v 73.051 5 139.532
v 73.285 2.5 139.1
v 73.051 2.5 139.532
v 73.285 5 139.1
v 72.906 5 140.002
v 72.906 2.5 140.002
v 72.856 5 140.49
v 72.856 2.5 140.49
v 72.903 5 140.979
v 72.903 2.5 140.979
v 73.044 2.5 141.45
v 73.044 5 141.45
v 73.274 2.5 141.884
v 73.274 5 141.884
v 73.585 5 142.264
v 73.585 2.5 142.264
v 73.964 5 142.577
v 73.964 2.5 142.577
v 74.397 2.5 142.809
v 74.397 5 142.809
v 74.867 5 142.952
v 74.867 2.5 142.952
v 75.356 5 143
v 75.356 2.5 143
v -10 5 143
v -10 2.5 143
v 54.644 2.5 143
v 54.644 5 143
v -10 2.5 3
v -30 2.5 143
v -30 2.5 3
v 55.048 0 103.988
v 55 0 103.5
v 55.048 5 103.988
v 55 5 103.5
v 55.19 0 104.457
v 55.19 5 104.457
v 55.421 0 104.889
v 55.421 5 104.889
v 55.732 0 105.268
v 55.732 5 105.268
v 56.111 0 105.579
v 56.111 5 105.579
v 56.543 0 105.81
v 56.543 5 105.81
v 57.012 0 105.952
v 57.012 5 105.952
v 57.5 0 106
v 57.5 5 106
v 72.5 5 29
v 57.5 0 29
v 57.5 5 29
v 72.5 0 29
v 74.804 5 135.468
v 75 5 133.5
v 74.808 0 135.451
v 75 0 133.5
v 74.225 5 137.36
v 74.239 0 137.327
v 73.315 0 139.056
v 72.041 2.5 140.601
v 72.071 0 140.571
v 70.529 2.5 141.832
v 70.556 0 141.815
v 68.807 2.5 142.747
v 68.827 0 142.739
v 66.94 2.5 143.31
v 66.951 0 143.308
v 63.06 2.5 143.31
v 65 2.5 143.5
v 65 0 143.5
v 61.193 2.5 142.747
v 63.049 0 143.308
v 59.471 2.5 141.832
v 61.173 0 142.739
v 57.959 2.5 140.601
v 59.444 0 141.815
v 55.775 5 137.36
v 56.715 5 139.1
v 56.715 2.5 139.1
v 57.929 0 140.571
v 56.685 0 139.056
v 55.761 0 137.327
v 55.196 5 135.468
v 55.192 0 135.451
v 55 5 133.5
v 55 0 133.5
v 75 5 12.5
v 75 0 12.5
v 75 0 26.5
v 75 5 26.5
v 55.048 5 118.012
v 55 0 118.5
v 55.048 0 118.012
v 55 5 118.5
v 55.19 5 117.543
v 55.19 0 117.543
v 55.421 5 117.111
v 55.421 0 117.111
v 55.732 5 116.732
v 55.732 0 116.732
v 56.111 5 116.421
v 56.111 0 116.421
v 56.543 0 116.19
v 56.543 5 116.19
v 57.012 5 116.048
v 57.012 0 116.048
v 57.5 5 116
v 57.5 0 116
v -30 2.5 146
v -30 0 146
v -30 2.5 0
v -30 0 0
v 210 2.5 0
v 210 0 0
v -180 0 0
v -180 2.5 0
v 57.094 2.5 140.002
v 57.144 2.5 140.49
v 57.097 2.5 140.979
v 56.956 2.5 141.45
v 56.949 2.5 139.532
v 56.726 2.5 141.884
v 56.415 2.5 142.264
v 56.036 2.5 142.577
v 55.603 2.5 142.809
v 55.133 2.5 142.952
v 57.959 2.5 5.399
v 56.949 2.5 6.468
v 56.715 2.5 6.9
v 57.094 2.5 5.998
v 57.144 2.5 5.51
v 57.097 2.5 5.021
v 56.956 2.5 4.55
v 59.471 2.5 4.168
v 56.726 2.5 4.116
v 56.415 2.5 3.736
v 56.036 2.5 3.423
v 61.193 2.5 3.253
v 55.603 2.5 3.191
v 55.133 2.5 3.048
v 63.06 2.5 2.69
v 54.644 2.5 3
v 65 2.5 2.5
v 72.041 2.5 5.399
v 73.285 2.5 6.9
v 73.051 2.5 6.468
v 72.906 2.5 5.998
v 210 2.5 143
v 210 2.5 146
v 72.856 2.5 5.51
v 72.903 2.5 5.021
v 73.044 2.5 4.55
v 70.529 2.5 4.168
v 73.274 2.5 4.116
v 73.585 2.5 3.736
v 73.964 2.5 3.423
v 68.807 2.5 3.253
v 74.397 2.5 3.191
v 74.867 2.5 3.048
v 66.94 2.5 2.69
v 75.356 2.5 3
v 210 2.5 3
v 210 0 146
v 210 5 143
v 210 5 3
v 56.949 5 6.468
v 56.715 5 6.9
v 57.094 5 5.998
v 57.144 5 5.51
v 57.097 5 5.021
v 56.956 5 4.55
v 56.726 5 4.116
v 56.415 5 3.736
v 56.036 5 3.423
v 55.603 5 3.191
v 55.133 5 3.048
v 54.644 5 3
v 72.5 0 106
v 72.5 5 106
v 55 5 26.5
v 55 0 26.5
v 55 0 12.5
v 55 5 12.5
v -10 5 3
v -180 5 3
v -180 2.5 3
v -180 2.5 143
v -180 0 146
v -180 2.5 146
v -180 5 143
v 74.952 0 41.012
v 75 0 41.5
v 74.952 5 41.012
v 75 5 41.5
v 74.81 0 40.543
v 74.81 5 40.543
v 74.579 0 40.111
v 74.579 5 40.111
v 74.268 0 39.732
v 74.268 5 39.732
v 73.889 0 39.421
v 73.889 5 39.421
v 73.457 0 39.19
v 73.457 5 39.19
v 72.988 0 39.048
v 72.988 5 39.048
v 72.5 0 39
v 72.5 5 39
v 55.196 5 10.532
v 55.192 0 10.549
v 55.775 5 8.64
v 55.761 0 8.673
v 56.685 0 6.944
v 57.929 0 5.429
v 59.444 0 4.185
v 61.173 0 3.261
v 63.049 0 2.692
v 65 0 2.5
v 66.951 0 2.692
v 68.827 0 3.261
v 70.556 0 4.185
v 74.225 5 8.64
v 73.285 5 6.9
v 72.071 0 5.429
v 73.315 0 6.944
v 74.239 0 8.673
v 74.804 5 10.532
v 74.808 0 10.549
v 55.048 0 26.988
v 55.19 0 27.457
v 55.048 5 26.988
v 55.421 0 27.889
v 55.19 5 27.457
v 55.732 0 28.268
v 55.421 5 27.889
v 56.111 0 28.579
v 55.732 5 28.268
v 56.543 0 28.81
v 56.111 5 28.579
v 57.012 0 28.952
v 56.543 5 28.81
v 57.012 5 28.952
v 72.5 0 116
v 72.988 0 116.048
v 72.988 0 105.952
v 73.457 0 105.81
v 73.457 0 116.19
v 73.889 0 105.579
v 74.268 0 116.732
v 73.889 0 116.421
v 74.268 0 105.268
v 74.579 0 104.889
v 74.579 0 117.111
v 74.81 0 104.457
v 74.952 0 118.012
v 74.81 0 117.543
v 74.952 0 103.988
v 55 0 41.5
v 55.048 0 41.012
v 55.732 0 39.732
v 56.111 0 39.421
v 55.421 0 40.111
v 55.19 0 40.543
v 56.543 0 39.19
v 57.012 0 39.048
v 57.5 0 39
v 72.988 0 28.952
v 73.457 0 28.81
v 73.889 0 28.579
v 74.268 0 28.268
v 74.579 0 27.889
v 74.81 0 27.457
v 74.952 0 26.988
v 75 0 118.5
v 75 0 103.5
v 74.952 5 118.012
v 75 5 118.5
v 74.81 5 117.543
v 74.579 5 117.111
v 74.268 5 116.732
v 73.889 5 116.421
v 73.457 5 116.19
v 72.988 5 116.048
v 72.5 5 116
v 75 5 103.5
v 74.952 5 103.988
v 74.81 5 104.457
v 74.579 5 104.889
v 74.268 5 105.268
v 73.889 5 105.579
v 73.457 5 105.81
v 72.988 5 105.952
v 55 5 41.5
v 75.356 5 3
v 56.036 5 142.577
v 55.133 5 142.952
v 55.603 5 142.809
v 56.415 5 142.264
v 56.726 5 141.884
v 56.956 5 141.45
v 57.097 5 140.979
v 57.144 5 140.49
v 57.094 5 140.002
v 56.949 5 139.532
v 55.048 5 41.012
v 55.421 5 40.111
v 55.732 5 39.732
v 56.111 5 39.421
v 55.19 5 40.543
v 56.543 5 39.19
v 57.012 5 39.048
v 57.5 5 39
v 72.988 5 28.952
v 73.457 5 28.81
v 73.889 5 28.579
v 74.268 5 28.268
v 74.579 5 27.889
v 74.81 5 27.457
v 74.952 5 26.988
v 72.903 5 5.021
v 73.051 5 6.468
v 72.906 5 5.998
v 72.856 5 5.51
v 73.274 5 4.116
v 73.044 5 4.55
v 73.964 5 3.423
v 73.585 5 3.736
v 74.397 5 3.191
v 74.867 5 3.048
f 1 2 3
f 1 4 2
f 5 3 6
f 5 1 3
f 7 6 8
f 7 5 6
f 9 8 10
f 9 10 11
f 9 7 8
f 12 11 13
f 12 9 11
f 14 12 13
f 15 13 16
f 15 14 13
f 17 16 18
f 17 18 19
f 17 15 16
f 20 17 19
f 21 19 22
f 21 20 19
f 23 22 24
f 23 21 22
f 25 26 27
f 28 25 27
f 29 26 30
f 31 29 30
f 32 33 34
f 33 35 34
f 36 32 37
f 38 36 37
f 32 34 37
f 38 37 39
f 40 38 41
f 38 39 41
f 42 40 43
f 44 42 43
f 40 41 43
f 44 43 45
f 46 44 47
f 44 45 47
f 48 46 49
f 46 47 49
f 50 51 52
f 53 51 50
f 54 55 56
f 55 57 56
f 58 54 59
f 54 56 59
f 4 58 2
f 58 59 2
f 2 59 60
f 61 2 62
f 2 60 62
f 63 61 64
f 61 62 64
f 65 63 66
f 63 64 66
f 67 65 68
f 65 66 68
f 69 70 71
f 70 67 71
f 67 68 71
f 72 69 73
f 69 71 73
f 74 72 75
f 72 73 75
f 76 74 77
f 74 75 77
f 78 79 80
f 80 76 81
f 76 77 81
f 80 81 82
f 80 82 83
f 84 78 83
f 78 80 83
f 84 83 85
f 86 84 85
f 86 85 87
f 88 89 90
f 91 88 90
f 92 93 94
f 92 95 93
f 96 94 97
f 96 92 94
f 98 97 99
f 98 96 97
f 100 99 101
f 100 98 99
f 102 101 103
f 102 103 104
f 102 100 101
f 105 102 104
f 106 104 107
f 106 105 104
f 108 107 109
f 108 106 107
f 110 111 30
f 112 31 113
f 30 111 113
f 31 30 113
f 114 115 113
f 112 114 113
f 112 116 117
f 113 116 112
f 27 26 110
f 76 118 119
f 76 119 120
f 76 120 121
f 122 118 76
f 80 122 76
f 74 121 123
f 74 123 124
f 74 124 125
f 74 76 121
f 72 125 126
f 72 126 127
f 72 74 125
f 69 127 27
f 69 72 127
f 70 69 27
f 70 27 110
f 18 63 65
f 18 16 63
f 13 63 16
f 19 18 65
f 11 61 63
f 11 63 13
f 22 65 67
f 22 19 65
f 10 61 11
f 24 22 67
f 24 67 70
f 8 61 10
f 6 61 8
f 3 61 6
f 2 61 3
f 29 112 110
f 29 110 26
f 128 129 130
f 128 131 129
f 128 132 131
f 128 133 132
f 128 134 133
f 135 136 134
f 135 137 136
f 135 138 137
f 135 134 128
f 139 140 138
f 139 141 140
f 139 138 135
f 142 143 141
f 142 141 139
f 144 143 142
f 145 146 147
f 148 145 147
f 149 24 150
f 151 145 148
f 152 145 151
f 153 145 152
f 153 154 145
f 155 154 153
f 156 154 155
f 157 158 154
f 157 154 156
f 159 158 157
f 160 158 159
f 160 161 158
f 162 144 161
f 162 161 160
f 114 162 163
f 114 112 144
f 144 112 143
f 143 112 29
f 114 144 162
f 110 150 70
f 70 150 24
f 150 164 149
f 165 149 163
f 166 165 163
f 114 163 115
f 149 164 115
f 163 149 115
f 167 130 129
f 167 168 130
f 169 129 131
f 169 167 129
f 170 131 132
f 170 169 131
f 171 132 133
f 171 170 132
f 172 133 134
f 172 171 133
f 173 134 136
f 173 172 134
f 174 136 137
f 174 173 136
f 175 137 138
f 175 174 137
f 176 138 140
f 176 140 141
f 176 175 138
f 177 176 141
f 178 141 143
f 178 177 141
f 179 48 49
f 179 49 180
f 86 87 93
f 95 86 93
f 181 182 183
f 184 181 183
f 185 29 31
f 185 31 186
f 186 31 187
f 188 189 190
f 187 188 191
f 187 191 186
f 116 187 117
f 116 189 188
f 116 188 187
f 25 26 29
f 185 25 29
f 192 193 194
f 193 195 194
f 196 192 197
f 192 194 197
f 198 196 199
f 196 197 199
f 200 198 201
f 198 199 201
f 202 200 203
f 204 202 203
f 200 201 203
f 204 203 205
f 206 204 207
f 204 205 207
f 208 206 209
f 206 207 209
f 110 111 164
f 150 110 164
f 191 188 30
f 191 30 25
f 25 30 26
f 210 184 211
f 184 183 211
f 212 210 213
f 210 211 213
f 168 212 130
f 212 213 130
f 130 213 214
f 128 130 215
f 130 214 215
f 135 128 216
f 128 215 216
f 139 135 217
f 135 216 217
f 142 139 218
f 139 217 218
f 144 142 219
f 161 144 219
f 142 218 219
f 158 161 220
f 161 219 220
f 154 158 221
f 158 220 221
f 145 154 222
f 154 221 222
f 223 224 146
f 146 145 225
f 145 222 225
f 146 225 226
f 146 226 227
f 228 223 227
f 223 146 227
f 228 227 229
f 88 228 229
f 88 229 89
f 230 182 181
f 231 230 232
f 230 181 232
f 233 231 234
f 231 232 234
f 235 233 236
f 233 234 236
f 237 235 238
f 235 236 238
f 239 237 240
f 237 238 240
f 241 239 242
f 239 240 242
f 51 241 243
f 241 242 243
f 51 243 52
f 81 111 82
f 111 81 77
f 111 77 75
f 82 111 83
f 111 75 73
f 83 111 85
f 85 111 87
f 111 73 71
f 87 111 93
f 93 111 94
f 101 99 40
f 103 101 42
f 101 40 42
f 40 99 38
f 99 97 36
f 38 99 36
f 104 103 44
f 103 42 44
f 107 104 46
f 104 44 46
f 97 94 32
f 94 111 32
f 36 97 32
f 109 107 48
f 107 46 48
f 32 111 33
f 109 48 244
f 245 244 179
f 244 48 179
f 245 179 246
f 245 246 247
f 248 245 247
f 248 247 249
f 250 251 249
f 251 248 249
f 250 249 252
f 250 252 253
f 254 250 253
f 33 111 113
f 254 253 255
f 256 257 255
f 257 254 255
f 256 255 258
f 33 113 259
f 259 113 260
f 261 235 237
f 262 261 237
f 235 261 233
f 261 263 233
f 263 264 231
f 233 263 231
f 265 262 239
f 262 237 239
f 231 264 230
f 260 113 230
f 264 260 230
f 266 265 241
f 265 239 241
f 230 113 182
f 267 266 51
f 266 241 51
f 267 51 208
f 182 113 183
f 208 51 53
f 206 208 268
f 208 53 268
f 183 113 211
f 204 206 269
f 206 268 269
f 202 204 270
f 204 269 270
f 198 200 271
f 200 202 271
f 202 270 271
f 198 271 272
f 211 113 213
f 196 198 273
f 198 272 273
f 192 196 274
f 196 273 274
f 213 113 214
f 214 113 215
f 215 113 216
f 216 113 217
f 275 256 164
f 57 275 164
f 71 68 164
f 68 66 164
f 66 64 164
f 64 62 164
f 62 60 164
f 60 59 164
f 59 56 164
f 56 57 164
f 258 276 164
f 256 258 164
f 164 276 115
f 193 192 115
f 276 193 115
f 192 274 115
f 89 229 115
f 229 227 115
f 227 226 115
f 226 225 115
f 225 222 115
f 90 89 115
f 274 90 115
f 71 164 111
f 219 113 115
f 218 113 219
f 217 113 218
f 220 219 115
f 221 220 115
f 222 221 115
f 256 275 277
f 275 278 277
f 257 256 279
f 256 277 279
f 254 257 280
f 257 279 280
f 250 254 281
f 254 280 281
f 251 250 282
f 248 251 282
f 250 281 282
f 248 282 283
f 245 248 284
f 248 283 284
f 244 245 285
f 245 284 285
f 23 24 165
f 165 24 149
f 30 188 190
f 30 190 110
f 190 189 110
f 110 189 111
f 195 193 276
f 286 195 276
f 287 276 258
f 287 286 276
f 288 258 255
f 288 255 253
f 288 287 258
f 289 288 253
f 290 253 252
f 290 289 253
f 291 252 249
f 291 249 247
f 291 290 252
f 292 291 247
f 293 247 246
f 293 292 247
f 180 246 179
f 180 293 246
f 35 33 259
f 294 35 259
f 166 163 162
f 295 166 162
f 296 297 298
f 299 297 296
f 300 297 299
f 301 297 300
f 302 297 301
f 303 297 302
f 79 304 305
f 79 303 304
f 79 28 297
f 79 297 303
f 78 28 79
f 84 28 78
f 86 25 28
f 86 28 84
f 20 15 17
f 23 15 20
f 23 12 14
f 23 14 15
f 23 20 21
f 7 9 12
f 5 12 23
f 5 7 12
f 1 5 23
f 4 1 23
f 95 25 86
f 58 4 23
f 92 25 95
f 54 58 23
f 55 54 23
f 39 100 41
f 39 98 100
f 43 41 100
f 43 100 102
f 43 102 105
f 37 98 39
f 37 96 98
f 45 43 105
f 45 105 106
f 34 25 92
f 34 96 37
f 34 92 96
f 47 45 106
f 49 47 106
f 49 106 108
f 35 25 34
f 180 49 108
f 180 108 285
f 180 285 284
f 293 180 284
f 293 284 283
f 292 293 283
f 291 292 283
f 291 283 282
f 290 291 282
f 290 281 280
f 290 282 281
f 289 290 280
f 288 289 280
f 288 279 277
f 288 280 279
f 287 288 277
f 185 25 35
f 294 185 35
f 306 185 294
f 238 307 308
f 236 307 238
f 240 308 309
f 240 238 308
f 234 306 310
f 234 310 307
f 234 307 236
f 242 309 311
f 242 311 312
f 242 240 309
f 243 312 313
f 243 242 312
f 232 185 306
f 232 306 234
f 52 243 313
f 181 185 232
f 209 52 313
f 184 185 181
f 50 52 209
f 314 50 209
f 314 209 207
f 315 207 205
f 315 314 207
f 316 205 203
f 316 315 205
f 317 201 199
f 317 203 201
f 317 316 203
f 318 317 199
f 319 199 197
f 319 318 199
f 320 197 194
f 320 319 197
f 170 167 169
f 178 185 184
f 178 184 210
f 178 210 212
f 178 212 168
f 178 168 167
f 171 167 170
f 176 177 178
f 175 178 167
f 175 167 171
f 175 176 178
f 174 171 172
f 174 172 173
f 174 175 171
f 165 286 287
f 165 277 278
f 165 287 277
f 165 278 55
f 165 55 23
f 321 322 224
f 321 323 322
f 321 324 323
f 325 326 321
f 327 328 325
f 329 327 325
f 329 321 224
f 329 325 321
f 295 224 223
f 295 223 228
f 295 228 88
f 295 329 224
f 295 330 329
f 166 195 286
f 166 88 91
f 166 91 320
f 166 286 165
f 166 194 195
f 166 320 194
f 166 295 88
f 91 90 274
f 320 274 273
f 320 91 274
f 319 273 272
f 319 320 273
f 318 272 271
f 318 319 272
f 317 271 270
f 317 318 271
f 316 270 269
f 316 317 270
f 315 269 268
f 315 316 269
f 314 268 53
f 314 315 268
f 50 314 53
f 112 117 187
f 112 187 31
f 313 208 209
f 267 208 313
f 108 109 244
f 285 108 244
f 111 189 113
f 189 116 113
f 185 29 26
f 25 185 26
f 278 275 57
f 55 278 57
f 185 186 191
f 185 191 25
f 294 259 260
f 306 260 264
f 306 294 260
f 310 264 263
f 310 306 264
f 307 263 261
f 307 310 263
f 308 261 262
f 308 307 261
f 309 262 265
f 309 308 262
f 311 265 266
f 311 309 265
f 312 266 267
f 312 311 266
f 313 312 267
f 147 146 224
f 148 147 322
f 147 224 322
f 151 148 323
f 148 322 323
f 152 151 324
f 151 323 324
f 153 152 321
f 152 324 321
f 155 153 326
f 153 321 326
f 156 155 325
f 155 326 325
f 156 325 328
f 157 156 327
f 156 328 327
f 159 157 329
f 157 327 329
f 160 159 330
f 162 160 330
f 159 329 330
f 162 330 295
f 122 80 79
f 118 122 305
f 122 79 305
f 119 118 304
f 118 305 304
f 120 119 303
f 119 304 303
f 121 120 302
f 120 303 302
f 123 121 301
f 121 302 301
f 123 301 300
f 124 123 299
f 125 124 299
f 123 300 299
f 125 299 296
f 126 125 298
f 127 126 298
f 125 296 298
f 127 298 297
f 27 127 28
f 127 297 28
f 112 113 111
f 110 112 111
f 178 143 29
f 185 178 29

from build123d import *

# Parameters (mm, degrees)
BOSS_EXTRUDE4_DEPTH   = 5
BOSS_EXTRUDE4_2_DEPTH = 5
BOSS_EXTRUDE5_DEPTH   = 2.5
SKETCH18_W            = 20.000000000060737
SKETCH18_H            = 9.999999999999986
BOSS_EXTRUDE6_DEPTH   = 5
FILLET4_R             = 2.5
FILLET5_R             = 2.5
BOSS_EXTRUDE7_DEPTH   = 5
CUT_EXTRUDE1_DEPTH    = 140.00000000000003
SKETCH16_7_W          = 150.00000000000003
SKETCH16_7_H          = 2.999999999999961
SKETCH16_7_W_2        = 150
SKETCH16_7_H_2        = 3
BOSS_EXTRUDE8_DEPTH   = 2.5


with BuildPart() as part:
    # Sketch16 → Boss-Extrude4 (new body)
    with BuildSketch(Plane(origin=(0, 0, 0), x_dir=(1, 0, 0), z_dir=(0, 1, 0))):
        with BuildLine():
            Line((61.87750100080055, -3.0000000000000027), (-9.999999999999972, -3.0000000000000027))
            Line((-9.99999999999998, -3), (-9.99999999999998, -143.00000000000003))
            Line((-9.999999999999972, -143.00000000000003), (61.87750100080078, -143.00000000000003))
            ThreePointArc((61.877501000800784, -142.99999999999997), (56.89984598936563, -139.36408603313456), (54.99999999999999, -133.49999999999997))
            Line((55, -133.49999999999997), (54.99999999999999, -12.5))
            ThreePointArc((54.99999999999999, -12.5), (56.89984598936555, -6.635913966865517), (61.87750100080056, -3.000000000000062))
        make_face()
    extrude(amount=BOSS_EXTRUDE4_DEPTH)



with BuildPart() as body_2:
    # Sketch16 → Boss-Extrude4 2 (new body)
    with BuildSketch(Plane(origin=(0, 0, 0), x_dir=(1, 0, 0), z_dir=(0, 1, 0))):
        with BuildLine():
            Line((209.99999999999991, -143.00000000000003), (209.99999999999991, -3.0000000000000027))
            Line((209.99999999999991, -3.0000000000000027), (68.12249899919945, -3.0000000000000027))
            ThreePointArc((68.12249899919944, -3.000000000000064), (73.10015401063445, -6.635913966865518), (75.00000000000001, -12.500000000000002))
            Line((75.00000000000001, -12.5), (75.00000000000001, -133.49999999999997))
            ThreePointArc((75, -133.49999999999997), (73.10015401063437, -139.36408603313456), (68.12249899919921, -142.99999999999997))
            Line((68.12249899919922, -143.00000000000003), (209.99999999999991, -143.00000000000003))
        make_face()
    extrude(amount=BOSS_EXTRUDE4_2_DEPTH)


with BuildPart() as part_1:
    add(part.part)

    add(body_2.part)  # Boss-Extrude5 merges body 2
    # Sketch16<5> → Boss-Extrude5 (add)
    with BuildSketch(Plane(origin=(0, 0, 0), x_dir=(1, 0, 0), z_dir=(0, 1, 0))):
        with BuildLine():
            Line((-29.99999999999998, 0), (-29.99999999999998, -146))
            Line((-29.99999999999998, -146), (209.99999999999991, -146.00000000000003))
            Line((209.99999999999991, -146.00000000000003), (209.99999999999991, -143.00000000000003))
            Line((209.99999999999991, -143.00000000000003), (68.12249899919922, -143.00000000000003))
            ThreePointArc((68.12249899919921, -142.99999999999997), (65, -143.49999999999997), (61.877501000800784, -142.99999999999997))
            Line((61.87750100080078, -143.00000000000003), (-9.999999999999972, -143.00000000000003))
            Line((-9.99999999999998, -143.00000000000003), (-9.99999999999998, -3))
            Line((-9.999999999999972, -3.0000000000000027), (61.87750100080055, -3.0000000000000027))
            ThreePointArc((61.87750100080056, -3.000000000000062), (65, -2.499999999999984), (68.12249899919944, -3.000000000000064))
            Line((68.12249899919945, -3.0000000000000027), (209.99999999999991, -3.0000000000000027))
            Line((209.99999999999991, -3.0000000000000027), (209.99999999999991, -4.161e-14))
            Line((209.99999999999991, -4.161e-14), (-29.99999999999997, 0))
        make_face()
    extrude(amount=BOSS_EXTRUDE5_DEPTH)

    # Sketch18 → Boss-Extrude6 (add)
    with BuildSketch(Plane.XZ):
        with Locations((65.00000000000001, 111.00000000000003)):
            Rectangle(SKETCH18_W, SKETCH18_H)
        Polygon((75.00000000003038, 39.00000000000002), (54.99999999996964, 39.00000000000002), (54.99999999996964, 29.000000000000025), (75.00000000003038, 29.000000000000018), align=None)
    extrude(amount=-BOSS_EXTRUDE6_DEPTH)

    # Fillet4
    fillet4_edges = [part_1.edges().sort_by_distance(p)[0] for p in [
        (75.00000000003038, 2.5, 116.00000000000001),
        (54.99999999996964, 2.5, 116.00000000000001),
        (75.00000000003038, 2.5, 39.00000000000002),
        (54.99999999996964, 2.5, 39.00000000000002),
        (54.99999999996964, 2.5, 106.00000000000003),
        (75.00000000003038, 2.5, 106.00000000000003),
        (75.00000000003038, 2.5, 29.000000000000018),
        (54.99999999996964, 2.5, 29.000000000000025),
    ]]
    fillet(fillet4_edges, radius=FILLET4_R)

    # Fillet5
    fillet5_edges = [part_1.edges().sort_by_distance(p)[0] for p in [
        (68.12249899919945, 3.75, 3.0000000000000333),
        (61.87750100080055, 3.75, 3.0000000000000333),
        (68.12249899919922, 3.75, 143),
        (61.87750100080078, 3.75, 143),
    ]]
    fillet(fillet5_edges, radius=FILLET5_R)


with BuildPart() as body_2_2:
    # Sketch16<6> → Boss-Extrude7 (new body)
    with BuildSketch(Plane(origin=(0, 0, 0), x_dir=(1, 0, 0), z_dir=(0, 1, 0))):
        Polygon((-180, -3.0000000000000027), (-179.99999999999997, -143.00000000000003), (-9.999999999999972, -143.00000000000003), (-9.99999999999998, -3), align=None)
    extrude(amount=BOSS_EXTRUDE7_DEPTH)

    # Sketch19 → Cut-Extrude1 (cut)
    with BuildSketch(Plane.XY.offset(143.00000000000003)):
        Polygon((-9.99999999999998, 2.5), (-29.999999999999982, 2.4999999999999973), (-29.999999999999982, 0), (-9.99999999999998, 0), align=None)
    extrude(amount=-CUT_EXTRUDE1_DEPTH, mode=Mode.SUBTRACT)

    # Sketch16<7> → Boss-Extrude8 (add)
    with BuildSketch(Plane(origin=(0, 0, 0), x_dir=(1, 0, 0), z_dir=(0, 1, 0))):
        with Locations((-104.99999999999999, -1.5000000000000222)):
            Rectangle(SKETCH16_7_W, SKETCH16_7_H)
        with Locations((-104.99999999999997, -144.50000000000003)):
            Rectangle(SKETCH16_7_W_2, SKETCH16_7_H_2)
    extrude(amount=BOSS_EXTRUDE8_DEPTH)


solid = Compound([part_1.part, body_2_2.part])
